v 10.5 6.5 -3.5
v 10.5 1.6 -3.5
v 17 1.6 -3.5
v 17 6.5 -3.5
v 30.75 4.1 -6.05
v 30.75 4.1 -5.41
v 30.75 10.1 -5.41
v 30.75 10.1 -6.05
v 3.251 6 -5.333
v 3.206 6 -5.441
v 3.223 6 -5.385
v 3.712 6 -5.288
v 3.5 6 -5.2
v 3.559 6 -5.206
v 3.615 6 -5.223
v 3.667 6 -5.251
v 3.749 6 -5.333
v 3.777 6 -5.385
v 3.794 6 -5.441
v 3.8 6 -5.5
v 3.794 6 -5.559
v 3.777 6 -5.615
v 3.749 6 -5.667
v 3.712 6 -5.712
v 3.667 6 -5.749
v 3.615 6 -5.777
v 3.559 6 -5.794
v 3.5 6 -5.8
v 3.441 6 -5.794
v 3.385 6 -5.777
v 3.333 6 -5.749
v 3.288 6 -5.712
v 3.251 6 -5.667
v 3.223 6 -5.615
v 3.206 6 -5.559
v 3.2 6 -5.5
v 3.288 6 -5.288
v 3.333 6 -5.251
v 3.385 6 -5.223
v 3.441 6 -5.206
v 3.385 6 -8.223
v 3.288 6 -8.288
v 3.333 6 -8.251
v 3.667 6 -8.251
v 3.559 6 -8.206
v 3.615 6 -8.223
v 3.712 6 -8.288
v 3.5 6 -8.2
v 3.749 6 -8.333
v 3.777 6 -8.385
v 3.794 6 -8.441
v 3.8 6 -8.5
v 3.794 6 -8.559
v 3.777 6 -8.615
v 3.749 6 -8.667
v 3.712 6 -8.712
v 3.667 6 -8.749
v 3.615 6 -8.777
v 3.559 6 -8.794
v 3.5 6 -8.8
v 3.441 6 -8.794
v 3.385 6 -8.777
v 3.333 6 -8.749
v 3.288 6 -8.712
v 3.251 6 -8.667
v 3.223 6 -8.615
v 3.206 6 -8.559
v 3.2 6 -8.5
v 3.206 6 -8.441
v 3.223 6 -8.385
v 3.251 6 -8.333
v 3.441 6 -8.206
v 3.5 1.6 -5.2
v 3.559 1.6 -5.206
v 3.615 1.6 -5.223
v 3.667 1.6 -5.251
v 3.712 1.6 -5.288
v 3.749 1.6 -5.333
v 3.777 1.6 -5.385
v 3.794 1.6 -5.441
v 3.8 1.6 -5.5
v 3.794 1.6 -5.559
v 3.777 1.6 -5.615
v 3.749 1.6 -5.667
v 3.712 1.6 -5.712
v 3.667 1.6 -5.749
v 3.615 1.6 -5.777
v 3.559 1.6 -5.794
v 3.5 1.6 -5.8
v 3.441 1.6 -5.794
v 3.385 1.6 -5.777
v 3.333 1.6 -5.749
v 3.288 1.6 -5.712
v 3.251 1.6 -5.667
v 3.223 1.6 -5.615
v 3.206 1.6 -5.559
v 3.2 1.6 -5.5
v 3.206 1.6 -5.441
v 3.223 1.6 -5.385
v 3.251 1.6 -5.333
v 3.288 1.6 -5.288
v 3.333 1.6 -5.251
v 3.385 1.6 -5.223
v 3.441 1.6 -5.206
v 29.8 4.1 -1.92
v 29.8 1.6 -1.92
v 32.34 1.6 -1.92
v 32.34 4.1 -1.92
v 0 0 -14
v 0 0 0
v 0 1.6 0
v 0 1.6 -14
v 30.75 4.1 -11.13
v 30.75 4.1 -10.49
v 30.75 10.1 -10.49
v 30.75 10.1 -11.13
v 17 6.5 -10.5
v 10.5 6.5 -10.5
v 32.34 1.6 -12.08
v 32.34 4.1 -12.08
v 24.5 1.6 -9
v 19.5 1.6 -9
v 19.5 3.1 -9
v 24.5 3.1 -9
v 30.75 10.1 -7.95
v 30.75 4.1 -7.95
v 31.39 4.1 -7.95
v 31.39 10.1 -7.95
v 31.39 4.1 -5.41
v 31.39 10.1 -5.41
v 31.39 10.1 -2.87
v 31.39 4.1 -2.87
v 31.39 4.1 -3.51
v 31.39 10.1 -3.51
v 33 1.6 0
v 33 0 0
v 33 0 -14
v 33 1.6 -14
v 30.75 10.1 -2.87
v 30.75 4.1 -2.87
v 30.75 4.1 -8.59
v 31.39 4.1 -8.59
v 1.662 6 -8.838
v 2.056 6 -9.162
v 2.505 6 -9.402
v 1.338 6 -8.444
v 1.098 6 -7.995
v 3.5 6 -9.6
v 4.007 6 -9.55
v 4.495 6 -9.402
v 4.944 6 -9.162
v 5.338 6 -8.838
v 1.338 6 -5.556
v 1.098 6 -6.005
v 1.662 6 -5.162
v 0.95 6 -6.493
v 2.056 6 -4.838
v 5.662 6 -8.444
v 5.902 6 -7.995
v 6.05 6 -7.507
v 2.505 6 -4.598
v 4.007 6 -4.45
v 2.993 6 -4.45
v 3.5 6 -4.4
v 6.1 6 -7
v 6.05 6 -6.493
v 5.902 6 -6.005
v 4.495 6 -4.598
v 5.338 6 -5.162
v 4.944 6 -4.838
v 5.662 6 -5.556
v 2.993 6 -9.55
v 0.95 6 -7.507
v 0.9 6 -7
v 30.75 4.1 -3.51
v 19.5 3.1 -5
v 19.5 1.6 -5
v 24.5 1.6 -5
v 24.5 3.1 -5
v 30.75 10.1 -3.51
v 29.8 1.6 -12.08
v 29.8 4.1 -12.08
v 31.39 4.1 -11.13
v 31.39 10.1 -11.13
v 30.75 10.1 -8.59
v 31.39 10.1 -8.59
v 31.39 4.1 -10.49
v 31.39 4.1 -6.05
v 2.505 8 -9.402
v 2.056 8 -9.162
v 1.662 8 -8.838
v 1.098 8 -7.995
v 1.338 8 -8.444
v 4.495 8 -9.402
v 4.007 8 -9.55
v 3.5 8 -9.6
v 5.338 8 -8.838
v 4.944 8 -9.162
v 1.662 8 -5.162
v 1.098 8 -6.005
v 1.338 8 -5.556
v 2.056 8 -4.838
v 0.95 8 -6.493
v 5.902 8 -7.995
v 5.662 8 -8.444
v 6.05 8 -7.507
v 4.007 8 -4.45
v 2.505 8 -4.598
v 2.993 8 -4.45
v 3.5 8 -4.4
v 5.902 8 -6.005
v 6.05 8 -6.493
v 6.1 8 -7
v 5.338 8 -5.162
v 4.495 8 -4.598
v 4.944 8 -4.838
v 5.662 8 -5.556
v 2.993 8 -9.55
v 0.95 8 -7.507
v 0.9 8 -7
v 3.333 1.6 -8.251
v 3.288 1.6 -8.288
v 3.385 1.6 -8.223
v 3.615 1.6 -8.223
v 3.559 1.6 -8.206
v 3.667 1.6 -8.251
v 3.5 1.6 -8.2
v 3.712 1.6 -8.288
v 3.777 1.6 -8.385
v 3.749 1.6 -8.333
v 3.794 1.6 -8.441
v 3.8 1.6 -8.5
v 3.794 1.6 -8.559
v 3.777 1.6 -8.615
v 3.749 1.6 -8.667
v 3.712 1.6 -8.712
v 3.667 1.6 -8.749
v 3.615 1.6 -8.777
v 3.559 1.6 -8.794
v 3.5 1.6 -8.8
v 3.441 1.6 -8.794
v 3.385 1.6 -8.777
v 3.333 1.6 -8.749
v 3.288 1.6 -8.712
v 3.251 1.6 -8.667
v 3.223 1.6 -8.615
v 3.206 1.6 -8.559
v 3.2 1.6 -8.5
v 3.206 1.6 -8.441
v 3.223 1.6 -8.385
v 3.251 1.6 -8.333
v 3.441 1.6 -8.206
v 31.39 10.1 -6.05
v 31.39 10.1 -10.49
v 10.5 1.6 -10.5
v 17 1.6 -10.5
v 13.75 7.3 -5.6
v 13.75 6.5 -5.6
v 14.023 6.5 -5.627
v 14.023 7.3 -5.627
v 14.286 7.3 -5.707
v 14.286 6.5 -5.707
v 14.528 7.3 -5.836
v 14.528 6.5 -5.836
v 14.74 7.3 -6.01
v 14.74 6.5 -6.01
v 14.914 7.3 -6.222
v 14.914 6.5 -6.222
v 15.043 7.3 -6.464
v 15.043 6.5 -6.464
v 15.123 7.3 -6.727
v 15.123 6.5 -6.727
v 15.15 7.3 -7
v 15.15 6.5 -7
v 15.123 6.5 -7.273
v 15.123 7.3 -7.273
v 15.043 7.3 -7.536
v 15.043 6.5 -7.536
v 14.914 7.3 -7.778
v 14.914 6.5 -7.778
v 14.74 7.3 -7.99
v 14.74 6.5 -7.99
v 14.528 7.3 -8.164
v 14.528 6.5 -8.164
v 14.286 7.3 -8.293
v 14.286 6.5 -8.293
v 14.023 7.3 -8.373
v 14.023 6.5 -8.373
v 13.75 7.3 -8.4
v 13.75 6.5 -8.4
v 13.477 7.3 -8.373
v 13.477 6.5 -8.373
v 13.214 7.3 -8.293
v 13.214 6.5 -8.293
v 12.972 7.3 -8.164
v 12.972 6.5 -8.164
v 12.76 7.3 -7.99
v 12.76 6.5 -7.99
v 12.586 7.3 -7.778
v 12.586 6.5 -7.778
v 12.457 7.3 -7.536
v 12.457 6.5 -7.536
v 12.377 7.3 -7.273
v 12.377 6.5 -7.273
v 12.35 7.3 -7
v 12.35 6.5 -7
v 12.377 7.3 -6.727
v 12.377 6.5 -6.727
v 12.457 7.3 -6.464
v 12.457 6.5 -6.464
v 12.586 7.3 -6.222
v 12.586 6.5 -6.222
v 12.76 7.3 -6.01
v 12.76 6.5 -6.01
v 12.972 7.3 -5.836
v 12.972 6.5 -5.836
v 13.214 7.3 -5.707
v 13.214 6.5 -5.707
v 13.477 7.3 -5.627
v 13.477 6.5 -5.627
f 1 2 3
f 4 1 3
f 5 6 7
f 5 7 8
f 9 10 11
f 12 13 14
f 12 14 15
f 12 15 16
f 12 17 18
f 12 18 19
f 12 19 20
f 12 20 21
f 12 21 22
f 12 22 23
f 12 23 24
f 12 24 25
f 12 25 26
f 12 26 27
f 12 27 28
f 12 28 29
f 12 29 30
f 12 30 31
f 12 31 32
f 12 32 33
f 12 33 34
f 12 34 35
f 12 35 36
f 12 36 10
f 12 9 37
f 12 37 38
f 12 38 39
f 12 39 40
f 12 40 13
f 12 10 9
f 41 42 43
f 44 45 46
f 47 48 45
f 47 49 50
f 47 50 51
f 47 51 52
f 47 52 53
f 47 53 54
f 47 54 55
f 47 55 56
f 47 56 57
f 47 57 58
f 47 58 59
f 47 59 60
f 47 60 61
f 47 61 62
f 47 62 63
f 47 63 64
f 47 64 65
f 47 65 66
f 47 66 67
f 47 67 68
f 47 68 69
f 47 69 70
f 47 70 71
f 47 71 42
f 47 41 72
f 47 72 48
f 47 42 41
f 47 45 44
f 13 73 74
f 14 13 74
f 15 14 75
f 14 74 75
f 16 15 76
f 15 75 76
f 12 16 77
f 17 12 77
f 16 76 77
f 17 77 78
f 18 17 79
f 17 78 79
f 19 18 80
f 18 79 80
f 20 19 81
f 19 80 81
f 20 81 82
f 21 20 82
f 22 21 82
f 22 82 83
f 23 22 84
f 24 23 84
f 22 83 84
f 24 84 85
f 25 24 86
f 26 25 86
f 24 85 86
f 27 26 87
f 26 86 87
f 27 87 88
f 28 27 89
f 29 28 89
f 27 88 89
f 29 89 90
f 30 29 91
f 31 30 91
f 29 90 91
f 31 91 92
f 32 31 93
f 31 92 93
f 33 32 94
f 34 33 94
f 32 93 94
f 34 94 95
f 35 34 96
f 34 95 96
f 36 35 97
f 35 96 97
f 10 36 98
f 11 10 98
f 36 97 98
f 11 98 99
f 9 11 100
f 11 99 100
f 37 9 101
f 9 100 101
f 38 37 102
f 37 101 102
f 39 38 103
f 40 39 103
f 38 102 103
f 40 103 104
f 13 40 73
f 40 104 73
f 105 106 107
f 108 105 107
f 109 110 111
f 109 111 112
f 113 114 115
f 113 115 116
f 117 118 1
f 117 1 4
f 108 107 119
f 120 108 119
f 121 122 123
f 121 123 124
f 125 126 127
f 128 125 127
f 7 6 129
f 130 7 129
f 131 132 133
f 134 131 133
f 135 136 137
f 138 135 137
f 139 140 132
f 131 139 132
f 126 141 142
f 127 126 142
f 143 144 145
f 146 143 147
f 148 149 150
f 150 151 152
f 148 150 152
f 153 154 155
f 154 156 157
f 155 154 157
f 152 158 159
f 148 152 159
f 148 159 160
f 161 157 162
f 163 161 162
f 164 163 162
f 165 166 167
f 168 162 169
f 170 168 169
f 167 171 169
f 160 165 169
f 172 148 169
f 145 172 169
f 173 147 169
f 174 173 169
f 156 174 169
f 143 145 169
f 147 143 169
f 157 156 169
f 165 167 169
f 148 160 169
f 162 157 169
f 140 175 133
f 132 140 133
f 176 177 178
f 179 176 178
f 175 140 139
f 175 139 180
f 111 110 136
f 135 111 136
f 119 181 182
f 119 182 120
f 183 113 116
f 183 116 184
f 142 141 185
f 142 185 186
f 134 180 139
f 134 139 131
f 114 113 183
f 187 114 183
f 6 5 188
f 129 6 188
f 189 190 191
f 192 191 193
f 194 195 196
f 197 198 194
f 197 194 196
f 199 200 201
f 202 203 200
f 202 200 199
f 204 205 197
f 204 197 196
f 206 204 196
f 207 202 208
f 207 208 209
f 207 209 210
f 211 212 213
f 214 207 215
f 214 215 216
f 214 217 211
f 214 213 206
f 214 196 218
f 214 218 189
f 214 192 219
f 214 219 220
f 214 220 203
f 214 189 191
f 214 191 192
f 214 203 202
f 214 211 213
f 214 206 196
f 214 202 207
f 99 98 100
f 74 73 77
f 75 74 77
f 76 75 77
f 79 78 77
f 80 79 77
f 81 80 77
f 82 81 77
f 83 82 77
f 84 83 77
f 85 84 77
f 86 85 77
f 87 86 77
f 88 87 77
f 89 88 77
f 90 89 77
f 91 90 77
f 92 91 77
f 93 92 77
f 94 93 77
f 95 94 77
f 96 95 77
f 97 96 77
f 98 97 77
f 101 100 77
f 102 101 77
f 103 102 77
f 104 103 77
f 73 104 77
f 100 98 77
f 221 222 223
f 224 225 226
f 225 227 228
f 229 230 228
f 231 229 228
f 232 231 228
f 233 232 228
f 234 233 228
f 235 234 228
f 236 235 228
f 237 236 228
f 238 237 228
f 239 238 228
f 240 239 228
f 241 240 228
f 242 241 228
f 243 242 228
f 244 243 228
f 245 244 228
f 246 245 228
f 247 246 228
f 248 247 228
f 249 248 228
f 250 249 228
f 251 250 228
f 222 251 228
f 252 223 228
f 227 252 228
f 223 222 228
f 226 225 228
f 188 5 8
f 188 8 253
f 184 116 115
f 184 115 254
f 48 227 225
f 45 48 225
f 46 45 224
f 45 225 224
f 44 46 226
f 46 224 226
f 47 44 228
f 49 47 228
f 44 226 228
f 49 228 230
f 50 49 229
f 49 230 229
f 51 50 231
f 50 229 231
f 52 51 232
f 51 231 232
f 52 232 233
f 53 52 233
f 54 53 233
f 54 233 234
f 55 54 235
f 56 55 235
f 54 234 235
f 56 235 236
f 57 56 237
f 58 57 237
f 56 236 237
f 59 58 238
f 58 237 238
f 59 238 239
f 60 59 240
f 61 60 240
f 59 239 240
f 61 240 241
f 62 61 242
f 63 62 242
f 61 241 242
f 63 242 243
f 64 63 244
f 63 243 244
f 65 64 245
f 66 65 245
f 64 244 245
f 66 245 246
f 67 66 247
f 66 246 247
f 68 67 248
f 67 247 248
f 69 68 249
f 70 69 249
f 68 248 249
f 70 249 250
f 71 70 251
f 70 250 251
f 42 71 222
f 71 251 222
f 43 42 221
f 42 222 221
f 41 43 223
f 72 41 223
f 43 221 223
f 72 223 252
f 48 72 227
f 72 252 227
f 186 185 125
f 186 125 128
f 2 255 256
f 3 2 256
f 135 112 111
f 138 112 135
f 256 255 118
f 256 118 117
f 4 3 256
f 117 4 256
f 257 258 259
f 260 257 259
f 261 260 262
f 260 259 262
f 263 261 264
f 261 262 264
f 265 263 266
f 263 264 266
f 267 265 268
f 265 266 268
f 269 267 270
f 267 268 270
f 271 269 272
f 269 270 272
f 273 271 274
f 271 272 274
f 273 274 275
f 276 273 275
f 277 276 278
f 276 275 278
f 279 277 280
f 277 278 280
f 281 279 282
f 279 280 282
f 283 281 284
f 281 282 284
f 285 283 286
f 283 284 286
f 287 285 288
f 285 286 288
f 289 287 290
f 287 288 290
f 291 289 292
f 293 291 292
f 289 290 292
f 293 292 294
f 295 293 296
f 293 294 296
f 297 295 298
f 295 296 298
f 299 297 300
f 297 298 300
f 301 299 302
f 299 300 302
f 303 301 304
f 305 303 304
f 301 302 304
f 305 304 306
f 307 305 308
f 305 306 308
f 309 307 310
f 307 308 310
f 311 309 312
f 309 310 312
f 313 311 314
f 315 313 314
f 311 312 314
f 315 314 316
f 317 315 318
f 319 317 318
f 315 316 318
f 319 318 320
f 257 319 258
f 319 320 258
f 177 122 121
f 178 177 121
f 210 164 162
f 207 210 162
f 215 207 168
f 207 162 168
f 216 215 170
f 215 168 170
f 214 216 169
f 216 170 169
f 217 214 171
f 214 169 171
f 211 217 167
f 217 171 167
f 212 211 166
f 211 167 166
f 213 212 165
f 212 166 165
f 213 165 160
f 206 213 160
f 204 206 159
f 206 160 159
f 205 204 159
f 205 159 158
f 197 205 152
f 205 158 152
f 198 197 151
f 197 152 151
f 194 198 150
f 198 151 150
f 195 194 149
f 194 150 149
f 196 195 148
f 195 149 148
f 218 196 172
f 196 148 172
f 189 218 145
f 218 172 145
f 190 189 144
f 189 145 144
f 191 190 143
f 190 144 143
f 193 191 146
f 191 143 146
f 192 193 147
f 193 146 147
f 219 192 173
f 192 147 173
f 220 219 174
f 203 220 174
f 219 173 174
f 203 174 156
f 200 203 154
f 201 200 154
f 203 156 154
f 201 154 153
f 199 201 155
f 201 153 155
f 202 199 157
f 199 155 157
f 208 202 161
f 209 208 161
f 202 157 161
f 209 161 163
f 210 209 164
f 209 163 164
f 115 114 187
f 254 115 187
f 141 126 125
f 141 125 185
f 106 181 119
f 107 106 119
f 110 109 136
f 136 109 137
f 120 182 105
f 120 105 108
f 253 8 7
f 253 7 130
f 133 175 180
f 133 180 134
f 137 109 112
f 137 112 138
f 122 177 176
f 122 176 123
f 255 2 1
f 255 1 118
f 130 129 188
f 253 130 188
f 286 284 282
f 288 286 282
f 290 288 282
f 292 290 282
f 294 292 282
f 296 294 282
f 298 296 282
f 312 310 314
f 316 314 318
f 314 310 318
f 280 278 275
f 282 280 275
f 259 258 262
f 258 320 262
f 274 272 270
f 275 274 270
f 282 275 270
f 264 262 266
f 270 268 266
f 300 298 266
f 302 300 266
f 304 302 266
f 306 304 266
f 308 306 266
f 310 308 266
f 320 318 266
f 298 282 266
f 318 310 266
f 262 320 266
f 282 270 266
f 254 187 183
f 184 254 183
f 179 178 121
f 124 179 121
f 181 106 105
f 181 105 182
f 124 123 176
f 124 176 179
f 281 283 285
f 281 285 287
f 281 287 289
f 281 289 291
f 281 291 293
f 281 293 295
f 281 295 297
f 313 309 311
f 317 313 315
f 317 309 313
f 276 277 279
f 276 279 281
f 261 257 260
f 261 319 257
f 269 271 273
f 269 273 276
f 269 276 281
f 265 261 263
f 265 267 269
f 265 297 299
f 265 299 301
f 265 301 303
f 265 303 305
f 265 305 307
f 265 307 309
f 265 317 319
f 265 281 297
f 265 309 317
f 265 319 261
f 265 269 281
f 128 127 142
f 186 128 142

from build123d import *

# Parameters (mm, degrees)
SK_PCB_W            = 33
SK_PCB_H            = 14
PCB_DEPTH           = 1.6
LDR_START           = 1.6
SK_LDR_LEGS_R       = 0.3
LDR_LEGS_DEPTH      = 4.4
LDR_LEGS_2_DEPTH    = 4.4
LDR_START_2         = 6
SK_LDR_CELL_R       = 2.6
LDR_CELL_DEPTH      = 2
TRIM_START          = 1.6
SK_TRIM_POT_W       = 6.5
SK_TRIM_POT_H       = 7
TRIM_POT_DEPTH      = 4.9
POT_START           = 6.5
SK_POT_SCREW_R      = 1.4
POT_SCREW_DEPTH     = 0.8
LM393_START         = 1.6
SK_LM393_W          = 5
SK_LM393_H          = 4
LM393_DEPTH         = 1.5
HEADER_START        = 1.6
SK_HEADER_4_PIN_W   = 2.54
SK_HEADER_4_PIN_H   = 10.16
HEADER_4_PIN_DEPTH  = 2.5
HEADER_START_2      = 4.1
SK_HEADER_PINS_W    = 0.64
SK_HEADER_PINS_H    = 0.64
HEADER_PINS_DEPTH   = 6
HEADER_PINS_2_DEPTH = 6
HEADER_PINS_3_DEPTH = 6
HEADER_PINS_4_DEPTH = 6


with BuildPart() as part:
    # SK PCB → PCB (new body)
    with BuildSketch(Plane(origin=(0, 0, 0), x_dir=(1, 0, 0), z_dir=(0, 1, 0))):
        with Locations((16.5, 7)):
            Rectangle(SK_PCB_W, SK_PCB_H)
    extrude(amount=PCB_DEPTH)


with BuildPart() as body_2:
    # SK LDR legs → LDR legs (new body)
    with BuildSketch(Plane(origin=(0, 0, 0), x_dir=(1, 0, 0), z_dir=(0, 1, 0)).offset(LDR_START)):
        with Locations(Location((3.5, 5.5, 0), (0, 0, 270))):
            Circle(SK_LDR_LEGS_R)
    extrude(amount=LDR_LEGS_DEPTH)


with BuildPart() as body_3:
    # SK LDR legs → LDR legs 2 (new body)
    with BuildSketch(Plane(origin=(0, 0, 0), x_dir=(1, 0, 0), z_dir=(0, 1, 0)).offset(LDR_START)):
        with Locations(Location((3.5, 8.5, 0), (0, 0, 270))):
            Circle(SK_LDR_LEGS_R)
    extrude(amount=LDR_LEGS_2_DEPTH)


with BuildPart() as body_4:
    # SK LDR cell → LDR cell (new body)
    with BuildSketch(Plane(origin=(0, 0, 0), x_dir=(1, 0, 0), z_dir=(0, 1, 0)).offset(LDR_START_2)):
        with Locations(Location((3.5, 7, 0), (0, 0, 270))):
            Circle(SK_LDR_CELL_R)
    extrude(amount=LDR_CELL_DEPTH)


with BuildPart() as body_5:
    # SK Trim pot → Trim pot (new body)
    with BuildSketch(Plane(origin=(0, 0, 0), x_dir=(1, 0, 0), z_dir=(0, 1, 0)).offset(TRIM_START)):
        with Locations((13.75, 7)):
            Rectangle(SK_TRIM_POT_W, SK_TRIM_POT_H)
    extrude(amount=TRIM_POT_DEPTH)


with BuildPart() as body_6:
    # SK Pot screw → Pot screw (new body)
    with BuildSketch(Plane(origin=(0, 0, 0), x_dir=(1, 0, 0), z_dir=(0, 1, 0)).offset(POT_START)):
        with Locations(Location((13.75, 7, 0), (0, 0, 270))):
            Circle(SK_POT_SCREW_R)
    extrude(amount=POT_SCREW_DEPTH)


with BuildPart() as body_7:
    # SK LM393 → LM393 (new body)
    with BuildSketch(Plane(origin=(0, 0, 0), x_dir=(1, 0, 0), z_dir=(0, 1, 0)).offset(LM393_START)):
        with Locations((22, 7)):
            Rectangle(SK_LM393_W, SK_LM393_H)
    extrude(amount=LM393_DEPTH)


with BuildPart() as body_8:
    # SK Header 4 pin → Header 4 pin (new body)
    with BuildSketch(Plane(origin=(0, 0, 0), x_dir=(1, 0, 0), z_dir=(0, 1, 0)).offset(HEADER_START)):
        with Locations((31.07, 7)):
            Rectangle(SK_HEADER_4_PIN_W, SK_HEADER_4_PIN_H)
    extrude(amount=HEADER_4_PIN_DEPTH)


with BuildPart() as body_9:
    # SK Header pins → Header pins (new body)
    with BuildSketch(Plane(origin=(0, 0, 0), x_dir=(1, 0, 0), z_dir=(0, 1, 0)).offset(HEADER_START_2)):
        with Locations((31.07, 10.81)):
            Rectangle(SK_HEADER_PINS_W, SK_HEADER_PINS_H)
    extrude(amount=HEADER_PINS_DEPTH)


with BuildPart() as body_10:
    # SK Header pins → Header pins 2 (new body)
    with BuildSketch(Plane(origin=(0, 0, 0), x_dir=(1, 0, 0), z_dir=(0, 1, 0)).offset(HEADER_START_2)):
        with Locations((31.07, 8.27)):
            Rectangle(SK_HEADER_PINS_W, SK_HEADER_PINS_H)
    extrude(amount=HEADER_PINS_2_DEPTH)


with BuildPart() as body_11:
    # SK Header pins → Header pins 3 (new body)
    with BuildSketch(Plane(origin=(0, 0, 0), x_dir=(1, 0, 0), z_dir=(0, 1, 0)).offset(HEADER_START_2)):
        with Locations((31.07, 5.73)):
            Rectangle(SK_HEADER_PINS_W, SK_HEADER_PINS_H)
    extrude(amount=HEADER_PINS_3_DEPTH)


with BuildPart() as body_12:
    # SK Header pins → Header pins 4 (new body)
    with BuildSketch(Plane(origin=(0, 0, 0), x_dir=(1, 0, 0), z_dir=(0, 1, 0)).offset(HEADER_START_2)):
        with Locations((31.07, 3.19)):
            Rectangle(SK_HEADER_PINS_W, SK_HEADER_PINS_H)
    extrude(amount=HEADER_PINS_4_DEPTH)


solid = Compound([part.part, body_2.part, body_3.part, body_4.part, body_5.part, body_6.part, body_7.part, body_8.part, body_9.part, body_10.part, body_11.part, body_12.part])
